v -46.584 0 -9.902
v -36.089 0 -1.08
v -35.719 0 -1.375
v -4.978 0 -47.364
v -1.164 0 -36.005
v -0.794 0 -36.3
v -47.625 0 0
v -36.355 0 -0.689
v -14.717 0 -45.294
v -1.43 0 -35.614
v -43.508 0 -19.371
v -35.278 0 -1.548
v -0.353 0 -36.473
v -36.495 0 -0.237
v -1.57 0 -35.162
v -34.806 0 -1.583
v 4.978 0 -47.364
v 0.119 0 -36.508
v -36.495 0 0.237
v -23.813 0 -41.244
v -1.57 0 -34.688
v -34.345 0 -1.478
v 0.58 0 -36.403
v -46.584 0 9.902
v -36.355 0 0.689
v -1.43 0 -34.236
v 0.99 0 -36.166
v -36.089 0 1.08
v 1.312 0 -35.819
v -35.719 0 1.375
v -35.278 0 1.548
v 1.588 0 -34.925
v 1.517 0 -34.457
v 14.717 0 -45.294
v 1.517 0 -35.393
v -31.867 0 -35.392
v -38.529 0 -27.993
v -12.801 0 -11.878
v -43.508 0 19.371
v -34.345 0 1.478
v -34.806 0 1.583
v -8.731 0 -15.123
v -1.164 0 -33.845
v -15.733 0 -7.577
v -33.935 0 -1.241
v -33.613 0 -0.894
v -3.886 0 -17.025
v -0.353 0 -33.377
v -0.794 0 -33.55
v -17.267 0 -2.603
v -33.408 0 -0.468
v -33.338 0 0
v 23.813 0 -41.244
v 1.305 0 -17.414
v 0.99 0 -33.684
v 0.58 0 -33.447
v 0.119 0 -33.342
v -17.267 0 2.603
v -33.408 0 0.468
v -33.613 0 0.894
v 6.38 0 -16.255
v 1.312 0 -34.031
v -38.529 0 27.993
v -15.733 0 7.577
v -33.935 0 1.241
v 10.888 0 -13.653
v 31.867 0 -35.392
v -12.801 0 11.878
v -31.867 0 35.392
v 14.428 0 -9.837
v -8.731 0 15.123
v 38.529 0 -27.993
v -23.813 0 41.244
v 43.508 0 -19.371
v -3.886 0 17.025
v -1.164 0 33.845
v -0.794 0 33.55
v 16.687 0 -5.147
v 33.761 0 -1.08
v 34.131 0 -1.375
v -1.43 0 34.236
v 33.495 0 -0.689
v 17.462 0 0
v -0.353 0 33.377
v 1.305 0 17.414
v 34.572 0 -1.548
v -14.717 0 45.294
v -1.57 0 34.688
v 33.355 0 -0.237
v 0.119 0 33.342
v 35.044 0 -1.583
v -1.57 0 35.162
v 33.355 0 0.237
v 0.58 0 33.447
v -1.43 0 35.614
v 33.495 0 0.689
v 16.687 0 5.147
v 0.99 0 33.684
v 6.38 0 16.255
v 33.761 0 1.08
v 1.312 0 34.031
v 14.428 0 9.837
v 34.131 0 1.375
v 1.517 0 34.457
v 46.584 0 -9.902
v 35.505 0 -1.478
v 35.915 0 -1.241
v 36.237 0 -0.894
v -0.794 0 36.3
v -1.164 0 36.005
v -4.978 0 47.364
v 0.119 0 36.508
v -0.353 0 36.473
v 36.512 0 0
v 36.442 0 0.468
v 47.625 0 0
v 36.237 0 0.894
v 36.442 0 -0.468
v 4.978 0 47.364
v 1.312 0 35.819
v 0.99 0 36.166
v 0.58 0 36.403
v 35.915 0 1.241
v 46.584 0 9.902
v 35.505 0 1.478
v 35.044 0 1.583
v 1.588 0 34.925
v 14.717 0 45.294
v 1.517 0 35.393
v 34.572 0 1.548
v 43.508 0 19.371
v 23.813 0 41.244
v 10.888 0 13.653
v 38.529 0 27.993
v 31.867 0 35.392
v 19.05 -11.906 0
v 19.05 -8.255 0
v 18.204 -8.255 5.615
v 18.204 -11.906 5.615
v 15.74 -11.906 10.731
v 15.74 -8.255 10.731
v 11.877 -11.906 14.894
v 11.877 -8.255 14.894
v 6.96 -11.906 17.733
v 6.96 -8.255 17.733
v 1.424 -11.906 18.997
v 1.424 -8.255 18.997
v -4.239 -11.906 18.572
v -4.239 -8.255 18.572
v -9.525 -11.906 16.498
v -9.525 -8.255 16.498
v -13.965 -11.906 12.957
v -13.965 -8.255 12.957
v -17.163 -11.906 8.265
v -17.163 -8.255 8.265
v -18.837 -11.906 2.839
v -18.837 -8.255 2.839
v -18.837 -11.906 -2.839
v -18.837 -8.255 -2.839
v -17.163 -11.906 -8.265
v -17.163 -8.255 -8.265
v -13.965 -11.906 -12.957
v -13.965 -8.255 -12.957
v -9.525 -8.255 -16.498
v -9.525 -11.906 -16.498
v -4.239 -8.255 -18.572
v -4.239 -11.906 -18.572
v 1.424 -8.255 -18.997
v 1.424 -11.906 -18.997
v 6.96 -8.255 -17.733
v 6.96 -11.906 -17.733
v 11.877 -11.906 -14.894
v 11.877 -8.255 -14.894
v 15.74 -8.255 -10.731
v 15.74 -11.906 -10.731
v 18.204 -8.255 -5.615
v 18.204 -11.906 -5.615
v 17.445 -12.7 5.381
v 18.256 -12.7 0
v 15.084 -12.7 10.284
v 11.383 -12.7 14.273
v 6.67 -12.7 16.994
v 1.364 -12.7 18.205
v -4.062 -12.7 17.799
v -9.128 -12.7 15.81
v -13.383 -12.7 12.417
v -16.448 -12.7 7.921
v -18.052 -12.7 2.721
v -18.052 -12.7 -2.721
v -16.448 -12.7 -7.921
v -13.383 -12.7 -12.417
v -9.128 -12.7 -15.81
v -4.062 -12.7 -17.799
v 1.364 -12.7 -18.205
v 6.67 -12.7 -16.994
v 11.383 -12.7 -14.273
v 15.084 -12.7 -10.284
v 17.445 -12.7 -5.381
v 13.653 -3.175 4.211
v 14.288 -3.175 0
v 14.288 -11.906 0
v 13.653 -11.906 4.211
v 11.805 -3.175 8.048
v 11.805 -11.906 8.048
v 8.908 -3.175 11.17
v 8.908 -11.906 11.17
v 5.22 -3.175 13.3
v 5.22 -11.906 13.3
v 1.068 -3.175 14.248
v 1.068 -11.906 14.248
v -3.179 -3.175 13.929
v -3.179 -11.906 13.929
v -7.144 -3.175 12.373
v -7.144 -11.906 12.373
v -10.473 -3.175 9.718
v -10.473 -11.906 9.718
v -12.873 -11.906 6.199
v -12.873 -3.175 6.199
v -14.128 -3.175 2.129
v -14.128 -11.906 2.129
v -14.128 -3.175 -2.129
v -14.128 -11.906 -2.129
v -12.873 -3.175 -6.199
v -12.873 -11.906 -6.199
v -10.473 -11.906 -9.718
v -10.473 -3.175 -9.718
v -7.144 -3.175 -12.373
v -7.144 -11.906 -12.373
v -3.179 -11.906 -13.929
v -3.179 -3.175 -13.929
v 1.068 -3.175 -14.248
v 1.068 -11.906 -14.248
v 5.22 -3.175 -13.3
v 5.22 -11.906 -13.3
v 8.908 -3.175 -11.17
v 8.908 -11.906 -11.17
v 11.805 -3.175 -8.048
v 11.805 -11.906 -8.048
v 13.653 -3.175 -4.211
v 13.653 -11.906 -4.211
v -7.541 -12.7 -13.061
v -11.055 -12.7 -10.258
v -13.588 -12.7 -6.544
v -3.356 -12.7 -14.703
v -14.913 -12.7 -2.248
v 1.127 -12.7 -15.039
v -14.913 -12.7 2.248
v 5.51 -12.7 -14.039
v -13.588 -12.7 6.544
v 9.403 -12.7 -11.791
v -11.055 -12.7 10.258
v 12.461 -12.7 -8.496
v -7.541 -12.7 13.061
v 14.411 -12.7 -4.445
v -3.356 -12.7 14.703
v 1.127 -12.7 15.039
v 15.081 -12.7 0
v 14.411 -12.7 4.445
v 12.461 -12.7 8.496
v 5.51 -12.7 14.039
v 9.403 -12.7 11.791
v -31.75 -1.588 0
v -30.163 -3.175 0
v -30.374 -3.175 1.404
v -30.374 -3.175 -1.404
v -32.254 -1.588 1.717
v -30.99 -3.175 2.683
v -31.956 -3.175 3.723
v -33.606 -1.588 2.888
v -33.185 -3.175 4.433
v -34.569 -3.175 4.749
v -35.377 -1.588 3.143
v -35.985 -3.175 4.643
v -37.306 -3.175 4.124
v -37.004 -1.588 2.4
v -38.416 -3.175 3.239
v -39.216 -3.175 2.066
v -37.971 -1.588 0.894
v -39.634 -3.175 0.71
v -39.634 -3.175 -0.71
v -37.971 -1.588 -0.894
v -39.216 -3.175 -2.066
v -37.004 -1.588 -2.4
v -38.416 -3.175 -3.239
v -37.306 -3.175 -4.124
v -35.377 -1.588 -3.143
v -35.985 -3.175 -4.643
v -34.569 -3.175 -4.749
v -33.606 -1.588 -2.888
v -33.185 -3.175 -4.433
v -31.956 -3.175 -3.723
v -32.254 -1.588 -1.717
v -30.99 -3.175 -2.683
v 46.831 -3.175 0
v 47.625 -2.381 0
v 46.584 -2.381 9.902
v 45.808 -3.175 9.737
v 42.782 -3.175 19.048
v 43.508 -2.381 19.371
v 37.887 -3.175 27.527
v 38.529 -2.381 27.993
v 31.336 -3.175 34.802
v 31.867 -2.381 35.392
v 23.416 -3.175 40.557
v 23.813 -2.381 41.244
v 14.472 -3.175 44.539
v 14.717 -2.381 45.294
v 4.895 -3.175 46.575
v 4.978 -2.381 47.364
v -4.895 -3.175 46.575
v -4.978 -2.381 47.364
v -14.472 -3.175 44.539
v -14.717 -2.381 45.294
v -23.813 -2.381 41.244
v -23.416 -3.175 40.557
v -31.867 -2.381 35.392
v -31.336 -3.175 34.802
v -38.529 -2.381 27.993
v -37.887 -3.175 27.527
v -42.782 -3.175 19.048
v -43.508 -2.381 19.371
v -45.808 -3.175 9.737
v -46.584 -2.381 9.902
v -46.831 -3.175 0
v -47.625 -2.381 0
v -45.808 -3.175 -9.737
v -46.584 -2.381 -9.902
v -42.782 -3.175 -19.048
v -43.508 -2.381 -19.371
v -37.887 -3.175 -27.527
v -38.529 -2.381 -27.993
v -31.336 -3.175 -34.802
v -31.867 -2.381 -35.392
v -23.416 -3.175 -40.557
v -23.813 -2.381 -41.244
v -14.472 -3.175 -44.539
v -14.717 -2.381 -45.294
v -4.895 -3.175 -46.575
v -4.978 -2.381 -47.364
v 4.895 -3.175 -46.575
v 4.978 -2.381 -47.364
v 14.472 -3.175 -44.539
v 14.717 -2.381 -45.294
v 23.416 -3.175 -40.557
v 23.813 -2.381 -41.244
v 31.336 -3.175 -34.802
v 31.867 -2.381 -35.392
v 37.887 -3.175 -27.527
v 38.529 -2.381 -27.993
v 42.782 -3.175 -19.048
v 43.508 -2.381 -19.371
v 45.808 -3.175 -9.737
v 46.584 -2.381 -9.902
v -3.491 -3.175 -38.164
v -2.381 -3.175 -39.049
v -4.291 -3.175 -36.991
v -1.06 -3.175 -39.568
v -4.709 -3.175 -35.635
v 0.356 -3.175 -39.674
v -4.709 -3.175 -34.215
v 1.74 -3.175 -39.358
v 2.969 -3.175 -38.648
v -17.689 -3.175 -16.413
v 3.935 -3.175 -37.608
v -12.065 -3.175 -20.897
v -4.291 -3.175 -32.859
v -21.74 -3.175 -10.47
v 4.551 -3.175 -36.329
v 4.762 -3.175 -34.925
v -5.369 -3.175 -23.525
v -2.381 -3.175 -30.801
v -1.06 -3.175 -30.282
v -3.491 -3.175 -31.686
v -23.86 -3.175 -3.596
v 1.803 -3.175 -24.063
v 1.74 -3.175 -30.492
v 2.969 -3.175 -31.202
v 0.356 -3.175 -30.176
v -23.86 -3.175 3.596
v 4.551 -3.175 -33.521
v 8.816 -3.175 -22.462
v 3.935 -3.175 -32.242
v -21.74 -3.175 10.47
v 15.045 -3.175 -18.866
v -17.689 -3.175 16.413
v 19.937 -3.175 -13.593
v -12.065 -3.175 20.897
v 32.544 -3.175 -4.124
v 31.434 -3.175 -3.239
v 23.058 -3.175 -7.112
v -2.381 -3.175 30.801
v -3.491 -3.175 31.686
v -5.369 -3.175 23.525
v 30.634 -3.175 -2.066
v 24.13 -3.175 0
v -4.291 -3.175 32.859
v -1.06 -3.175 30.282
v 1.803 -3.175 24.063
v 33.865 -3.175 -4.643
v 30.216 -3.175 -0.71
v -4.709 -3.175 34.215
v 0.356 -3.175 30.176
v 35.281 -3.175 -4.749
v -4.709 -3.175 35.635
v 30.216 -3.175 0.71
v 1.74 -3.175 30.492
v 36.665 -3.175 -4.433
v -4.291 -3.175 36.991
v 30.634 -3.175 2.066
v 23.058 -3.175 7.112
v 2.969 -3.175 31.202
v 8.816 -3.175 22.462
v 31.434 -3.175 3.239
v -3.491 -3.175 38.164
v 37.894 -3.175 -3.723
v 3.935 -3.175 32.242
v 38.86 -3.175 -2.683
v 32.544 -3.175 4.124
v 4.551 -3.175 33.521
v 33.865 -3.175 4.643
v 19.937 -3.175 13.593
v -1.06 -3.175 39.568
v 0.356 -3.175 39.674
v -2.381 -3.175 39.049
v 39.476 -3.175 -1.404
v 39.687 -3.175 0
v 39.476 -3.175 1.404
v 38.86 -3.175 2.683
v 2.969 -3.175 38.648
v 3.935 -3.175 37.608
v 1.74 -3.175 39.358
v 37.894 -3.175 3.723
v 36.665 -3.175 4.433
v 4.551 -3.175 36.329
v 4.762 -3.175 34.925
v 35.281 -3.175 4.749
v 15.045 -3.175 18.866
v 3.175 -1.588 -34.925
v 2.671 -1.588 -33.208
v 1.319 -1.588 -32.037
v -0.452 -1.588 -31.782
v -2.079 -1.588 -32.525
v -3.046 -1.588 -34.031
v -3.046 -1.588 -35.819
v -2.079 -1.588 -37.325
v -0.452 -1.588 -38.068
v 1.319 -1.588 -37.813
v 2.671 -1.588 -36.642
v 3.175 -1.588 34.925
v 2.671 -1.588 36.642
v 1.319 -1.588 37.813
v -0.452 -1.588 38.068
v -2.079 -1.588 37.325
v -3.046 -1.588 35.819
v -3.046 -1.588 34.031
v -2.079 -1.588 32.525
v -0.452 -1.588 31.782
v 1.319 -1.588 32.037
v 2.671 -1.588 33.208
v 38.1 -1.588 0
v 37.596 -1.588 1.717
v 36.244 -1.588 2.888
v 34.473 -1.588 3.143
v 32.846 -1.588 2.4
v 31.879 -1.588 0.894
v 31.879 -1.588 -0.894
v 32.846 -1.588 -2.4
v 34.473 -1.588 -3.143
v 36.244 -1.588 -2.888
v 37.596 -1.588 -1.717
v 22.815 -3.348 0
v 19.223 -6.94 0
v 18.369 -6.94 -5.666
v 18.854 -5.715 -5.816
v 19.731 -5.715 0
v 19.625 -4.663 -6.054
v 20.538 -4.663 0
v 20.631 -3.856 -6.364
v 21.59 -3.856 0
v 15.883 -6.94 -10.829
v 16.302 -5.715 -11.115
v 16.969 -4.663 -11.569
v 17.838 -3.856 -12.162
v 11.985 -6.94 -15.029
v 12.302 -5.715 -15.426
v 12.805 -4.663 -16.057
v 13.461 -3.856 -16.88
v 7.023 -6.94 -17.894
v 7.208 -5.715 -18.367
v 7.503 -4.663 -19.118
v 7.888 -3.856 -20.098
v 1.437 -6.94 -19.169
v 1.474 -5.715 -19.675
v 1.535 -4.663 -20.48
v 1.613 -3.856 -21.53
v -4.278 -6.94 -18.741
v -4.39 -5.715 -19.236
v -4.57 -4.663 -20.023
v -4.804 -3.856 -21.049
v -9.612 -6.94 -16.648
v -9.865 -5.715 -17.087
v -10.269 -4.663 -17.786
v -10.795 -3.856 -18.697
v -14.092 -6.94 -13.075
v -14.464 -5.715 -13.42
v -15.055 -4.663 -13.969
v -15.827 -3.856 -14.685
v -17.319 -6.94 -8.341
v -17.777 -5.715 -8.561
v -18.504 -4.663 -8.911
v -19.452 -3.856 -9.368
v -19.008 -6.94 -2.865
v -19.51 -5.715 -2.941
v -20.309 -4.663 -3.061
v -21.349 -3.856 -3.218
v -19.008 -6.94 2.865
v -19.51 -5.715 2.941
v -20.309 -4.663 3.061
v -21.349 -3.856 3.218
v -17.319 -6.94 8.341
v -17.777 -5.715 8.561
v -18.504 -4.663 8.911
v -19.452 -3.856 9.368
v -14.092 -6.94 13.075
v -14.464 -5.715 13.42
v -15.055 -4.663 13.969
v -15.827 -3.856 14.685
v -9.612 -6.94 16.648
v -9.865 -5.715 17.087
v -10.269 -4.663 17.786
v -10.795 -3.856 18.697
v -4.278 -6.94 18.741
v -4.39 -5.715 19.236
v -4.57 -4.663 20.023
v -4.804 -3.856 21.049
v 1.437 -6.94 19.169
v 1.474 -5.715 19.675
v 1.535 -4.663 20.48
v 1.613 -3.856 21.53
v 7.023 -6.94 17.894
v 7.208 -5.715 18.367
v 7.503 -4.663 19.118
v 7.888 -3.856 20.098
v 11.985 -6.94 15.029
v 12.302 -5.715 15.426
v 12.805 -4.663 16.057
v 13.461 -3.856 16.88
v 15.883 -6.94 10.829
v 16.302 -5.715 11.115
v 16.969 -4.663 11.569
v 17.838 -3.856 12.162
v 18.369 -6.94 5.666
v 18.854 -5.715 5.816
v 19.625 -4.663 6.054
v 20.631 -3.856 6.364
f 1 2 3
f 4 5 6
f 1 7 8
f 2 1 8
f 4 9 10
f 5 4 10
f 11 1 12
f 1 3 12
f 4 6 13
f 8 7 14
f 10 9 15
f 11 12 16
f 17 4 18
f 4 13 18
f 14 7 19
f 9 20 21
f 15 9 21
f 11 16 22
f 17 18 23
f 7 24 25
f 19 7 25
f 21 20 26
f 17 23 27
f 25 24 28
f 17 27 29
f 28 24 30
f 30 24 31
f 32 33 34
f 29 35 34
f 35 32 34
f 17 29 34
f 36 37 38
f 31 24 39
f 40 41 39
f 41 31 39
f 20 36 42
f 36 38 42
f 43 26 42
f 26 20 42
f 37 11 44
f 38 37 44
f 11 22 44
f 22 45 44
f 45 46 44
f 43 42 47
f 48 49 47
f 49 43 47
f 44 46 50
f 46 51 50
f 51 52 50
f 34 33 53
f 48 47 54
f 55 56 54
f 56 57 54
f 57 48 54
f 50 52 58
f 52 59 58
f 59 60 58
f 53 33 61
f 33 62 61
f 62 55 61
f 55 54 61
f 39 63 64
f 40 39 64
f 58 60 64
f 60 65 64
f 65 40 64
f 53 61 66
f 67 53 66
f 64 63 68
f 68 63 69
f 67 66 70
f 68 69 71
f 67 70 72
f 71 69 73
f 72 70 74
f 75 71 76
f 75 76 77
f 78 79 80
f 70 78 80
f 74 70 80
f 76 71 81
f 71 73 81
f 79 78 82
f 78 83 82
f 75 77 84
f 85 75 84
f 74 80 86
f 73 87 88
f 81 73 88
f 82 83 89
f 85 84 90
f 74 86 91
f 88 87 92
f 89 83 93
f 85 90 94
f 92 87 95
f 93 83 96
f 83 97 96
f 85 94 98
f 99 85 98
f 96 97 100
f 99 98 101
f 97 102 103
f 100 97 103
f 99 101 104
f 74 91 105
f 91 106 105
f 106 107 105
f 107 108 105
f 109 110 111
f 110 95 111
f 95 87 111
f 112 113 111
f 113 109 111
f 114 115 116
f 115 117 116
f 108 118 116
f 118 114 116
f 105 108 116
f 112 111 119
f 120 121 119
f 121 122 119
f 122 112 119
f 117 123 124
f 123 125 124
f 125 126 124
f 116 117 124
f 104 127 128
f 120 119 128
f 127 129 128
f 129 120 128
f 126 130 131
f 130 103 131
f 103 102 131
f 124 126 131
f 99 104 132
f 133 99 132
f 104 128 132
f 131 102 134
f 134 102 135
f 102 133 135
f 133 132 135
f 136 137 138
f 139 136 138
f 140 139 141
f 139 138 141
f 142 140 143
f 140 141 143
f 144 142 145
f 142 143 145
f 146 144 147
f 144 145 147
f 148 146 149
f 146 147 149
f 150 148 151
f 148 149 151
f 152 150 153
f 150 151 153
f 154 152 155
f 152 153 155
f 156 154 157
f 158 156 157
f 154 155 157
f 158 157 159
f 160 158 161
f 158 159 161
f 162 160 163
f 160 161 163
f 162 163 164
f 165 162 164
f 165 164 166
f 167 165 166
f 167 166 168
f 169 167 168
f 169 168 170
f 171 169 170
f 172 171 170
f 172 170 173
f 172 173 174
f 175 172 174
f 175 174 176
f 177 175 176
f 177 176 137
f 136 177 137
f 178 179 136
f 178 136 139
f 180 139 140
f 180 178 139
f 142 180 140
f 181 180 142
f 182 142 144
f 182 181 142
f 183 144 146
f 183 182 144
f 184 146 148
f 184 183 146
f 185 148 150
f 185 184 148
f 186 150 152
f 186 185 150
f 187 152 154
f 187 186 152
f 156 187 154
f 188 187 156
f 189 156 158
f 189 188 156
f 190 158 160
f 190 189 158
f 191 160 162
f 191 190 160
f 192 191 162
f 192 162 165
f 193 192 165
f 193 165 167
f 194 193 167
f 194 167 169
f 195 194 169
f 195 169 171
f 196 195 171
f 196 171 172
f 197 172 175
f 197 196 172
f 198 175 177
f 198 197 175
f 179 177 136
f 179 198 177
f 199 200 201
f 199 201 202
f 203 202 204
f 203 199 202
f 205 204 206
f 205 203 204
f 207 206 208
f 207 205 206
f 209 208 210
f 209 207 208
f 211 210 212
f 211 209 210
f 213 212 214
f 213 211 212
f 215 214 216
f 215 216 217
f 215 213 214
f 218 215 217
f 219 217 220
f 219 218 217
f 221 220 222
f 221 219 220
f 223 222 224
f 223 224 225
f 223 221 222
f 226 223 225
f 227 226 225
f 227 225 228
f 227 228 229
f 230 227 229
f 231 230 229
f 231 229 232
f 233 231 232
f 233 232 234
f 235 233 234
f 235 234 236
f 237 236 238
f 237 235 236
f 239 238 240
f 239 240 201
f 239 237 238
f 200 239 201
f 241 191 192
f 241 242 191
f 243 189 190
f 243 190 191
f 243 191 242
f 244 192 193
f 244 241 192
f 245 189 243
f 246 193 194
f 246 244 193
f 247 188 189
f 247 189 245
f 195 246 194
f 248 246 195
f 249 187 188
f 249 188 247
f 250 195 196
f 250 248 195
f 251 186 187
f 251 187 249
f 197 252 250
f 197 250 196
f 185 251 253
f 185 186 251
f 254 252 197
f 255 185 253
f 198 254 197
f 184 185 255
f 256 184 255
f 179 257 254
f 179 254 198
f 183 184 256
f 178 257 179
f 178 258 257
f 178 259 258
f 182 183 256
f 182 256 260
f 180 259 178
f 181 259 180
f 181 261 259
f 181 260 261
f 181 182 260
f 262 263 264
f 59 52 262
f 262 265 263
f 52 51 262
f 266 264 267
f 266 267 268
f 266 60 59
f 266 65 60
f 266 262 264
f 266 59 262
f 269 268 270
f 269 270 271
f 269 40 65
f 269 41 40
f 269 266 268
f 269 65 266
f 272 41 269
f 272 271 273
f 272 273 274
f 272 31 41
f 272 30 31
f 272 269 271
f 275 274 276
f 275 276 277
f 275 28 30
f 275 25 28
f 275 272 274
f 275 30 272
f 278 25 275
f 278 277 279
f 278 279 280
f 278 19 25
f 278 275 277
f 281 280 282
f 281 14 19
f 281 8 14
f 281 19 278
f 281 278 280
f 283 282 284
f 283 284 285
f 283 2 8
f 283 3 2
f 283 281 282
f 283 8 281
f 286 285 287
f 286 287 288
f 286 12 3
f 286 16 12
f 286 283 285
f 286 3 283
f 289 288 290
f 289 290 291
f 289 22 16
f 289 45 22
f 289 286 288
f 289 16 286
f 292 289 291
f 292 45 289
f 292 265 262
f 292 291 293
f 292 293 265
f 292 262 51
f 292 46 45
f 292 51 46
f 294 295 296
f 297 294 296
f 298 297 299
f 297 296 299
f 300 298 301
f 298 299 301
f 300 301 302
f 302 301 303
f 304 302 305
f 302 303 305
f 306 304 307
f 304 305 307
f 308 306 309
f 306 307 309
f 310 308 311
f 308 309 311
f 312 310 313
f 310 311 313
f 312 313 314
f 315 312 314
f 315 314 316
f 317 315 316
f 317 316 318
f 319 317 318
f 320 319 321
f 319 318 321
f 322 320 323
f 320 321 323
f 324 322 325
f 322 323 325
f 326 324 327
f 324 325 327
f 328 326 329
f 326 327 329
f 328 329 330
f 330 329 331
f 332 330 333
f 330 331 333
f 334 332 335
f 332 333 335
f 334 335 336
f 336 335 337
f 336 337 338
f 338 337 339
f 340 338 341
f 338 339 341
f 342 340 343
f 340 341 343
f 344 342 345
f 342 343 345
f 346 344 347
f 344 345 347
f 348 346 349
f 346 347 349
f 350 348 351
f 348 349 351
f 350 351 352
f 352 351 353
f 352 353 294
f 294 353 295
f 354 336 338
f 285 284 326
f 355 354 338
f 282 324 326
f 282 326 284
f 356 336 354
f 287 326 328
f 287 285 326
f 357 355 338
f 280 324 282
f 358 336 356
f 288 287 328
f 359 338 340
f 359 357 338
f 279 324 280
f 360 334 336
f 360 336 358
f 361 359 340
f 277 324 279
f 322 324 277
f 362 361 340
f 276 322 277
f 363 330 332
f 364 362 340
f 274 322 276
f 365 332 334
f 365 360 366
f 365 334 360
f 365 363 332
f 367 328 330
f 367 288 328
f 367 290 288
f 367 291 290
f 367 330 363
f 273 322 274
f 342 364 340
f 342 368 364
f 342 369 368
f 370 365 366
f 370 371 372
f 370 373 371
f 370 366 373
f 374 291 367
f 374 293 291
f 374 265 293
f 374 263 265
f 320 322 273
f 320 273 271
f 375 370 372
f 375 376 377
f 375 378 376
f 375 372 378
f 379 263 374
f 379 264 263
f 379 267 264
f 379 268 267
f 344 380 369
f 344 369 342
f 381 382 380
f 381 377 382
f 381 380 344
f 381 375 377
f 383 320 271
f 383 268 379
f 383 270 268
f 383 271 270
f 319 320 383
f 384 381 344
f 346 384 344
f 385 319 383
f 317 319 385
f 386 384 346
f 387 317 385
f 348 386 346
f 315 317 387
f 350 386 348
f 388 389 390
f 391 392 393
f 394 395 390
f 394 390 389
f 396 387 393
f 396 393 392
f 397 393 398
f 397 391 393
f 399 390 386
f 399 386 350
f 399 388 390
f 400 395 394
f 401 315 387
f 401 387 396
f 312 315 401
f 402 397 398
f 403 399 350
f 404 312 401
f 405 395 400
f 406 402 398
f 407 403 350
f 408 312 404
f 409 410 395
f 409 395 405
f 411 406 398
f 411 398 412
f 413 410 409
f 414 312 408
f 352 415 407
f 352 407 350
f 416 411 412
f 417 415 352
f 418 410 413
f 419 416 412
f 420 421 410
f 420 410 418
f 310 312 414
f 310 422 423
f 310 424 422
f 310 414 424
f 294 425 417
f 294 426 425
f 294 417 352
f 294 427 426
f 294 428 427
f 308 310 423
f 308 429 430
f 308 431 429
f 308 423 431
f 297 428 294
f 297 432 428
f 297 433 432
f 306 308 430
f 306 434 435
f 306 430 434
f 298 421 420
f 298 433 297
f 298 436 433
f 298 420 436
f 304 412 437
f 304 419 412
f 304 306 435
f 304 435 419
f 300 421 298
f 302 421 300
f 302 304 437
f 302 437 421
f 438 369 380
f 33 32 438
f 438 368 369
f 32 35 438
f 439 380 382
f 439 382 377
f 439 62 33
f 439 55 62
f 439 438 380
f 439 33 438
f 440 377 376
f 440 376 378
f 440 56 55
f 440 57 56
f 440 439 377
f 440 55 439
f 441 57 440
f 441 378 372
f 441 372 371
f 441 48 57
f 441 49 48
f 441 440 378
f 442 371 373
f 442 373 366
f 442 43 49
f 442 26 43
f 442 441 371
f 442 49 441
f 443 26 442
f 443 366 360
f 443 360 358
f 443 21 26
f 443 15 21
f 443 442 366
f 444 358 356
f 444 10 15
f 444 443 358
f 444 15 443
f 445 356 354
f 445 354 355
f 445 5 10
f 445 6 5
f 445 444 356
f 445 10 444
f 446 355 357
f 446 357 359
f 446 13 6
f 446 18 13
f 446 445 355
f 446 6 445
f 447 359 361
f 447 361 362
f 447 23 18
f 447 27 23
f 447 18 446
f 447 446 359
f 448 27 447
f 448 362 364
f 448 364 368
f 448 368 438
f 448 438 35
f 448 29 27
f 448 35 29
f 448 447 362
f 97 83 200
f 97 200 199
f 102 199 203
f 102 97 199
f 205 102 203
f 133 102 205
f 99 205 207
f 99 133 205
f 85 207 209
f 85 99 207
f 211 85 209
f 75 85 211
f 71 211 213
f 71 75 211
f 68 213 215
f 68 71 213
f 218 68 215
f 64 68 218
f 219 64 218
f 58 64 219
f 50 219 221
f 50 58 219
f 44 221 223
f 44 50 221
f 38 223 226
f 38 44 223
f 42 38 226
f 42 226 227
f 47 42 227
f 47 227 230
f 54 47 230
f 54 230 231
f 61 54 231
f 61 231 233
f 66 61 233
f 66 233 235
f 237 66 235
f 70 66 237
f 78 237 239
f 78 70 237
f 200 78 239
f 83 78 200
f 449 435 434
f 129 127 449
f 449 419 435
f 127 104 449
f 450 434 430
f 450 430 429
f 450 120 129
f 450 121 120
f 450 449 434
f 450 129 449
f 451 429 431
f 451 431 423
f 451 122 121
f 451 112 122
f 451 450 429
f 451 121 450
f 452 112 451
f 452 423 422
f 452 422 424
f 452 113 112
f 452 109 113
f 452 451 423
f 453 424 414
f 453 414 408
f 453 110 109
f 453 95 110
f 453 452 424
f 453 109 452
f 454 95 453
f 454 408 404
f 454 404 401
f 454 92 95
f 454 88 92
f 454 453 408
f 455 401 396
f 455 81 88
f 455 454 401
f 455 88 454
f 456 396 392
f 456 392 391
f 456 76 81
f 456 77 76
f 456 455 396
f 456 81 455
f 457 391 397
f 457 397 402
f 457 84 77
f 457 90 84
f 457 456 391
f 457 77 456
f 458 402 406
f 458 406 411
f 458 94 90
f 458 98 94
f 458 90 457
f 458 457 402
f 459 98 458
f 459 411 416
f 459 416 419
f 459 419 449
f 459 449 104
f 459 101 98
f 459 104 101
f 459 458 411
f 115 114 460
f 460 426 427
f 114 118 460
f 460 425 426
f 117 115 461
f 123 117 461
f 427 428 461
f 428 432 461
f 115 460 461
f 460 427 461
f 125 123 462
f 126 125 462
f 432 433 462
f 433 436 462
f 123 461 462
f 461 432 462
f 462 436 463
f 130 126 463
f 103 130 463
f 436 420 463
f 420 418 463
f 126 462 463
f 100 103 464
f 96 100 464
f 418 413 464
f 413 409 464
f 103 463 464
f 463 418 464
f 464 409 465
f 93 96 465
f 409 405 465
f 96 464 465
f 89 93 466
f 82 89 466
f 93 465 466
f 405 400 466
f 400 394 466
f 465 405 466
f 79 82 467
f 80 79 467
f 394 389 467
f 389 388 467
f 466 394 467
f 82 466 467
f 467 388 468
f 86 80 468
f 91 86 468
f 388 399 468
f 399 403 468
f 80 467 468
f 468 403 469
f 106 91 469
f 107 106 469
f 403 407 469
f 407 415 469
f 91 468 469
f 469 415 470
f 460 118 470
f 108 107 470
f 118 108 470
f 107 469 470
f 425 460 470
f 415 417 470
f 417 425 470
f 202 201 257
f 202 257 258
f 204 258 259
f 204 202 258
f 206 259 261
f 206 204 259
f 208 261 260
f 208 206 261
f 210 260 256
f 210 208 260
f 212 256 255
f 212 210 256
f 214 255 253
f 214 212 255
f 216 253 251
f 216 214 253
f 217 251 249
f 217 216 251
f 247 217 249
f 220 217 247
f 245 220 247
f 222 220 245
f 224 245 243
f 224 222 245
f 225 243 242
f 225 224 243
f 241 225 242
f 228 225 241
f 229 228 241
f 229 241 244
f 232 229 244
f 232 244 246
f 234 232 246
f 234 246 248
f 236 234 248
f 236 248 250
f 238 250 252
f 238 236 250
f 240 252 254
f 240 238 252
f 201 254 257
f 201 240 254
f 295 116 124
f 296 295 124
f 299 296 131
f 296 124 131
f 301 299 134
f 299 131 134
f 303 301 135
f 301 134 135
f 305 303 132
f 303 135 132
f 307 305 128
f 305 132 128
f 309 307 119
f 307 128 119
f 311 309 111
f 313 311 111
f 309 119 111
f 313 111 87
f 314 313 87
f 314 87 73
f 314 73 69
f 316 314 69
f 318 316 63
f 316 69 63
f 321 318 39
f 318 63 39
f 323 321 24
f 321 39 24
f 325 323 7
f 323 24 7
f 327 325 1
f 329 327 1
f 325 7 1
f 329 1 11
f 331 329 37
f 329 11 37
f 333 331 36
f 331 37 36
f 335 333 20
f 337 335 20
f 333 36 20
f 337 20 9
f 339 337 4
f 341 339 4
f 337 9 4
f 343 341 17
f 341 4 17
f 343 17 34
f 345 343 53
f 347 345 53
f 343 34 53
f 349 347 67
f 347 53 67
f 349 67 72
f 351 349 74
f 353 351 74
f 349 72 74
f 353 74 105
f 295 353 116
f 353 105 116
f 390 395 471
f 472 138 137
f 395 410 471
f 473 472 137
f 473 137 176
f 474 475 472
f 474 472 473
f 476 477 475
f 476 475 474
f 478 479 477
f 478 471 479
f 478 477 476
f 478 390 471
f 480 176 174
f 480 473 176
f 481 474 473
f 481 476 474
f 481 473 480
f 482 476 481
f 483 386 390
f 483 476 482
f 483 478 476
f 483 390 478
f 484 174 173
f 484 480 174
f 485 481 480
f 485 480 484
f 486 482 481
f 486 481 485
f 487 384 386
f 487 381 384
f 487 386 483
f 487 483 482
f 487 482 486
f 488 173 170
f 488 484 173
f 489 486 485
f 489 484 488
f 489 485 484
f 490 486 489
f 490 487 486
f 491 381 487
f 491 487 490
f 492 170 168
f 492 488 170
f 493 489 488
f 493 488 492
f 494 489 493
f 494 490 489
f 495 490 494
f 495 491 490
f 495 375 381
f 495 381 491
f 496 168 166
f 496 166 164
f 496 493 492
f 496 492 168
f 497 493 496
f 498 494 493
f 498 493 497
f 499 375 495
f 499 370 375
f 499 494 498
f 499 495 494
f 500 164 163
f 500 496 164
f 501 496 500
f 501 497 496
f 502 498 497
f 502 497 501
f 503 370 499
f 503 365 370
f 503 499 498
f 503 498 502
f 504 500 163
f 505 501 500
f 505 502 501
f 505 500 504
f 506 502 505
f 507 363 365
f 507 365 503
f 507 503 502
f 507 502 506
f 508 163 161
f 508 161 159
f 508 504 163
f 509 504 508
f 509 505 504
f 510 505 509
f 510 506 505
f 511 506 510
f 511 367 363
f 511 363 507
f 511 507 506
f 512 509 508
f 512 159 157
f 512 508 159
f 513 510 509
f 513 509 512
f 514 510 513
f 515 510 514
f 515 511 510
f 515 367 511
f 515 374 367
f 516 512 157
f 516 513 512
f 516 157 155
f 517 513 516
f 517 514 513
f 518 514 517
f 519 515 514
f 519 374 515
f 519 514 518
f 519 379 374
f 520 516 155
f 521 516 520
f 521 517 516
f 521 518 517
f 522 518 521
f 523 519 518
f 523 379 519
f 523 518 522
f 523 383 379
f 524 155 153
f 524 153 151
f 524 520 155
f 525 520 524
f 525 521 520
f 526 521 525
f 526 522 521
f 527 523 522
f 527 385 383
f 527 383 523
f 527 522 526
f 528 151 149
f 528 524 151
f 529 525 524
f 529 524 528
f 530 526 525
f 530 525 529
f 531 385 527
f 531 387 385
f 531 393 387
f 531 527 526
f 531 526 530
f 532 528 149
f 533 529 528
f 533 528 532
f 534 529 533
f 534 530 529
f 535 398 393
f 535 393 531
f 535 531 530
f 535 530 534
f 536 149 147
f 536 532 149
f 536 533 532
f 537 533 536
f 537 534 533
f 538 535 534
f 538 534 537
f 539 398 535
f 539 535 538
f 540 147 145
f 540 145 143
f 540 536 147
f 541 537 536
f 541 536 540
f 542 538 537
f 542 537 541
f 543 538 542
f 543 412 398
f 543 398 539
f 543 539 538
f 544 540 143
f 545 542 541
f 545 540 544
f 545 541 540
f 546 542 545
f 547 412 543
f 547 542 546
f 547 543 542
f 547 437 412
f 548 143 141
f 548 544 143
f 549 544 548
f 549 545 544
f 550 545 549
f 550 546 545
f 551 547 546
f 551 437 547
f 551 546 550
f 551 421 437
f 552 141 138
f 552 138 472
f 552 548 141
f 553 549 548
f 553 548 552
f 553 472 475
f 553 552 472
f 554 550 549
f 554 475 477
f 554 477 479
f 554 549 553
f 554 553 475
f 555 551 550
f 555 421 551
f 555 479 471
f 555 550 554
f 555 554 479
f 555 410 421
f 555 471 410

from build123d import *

# Parameters (mm, degrees)
F0_R     = 47.625
F0_R_2   = 1.5875
F0_R_3   = 19.05
F0_R_4   = 14.2875
F1_DEPTH = 3.175
F2_DEPTH = 12.7
F3_SIZE  = 3.17499
F4_SIZE  = 0.79375
F5_SIZE  = 0.79375
F6_R     = 5.08
F7_SIZE  = 3.175


# Not quite as in the source:
# - a fillet or chamfer is up to 0.001 mm smaller than in the source, because OpenCascade refuses the exact size


with BuildPart() as f1:
    # F0 (on Front) → F1 (new body)
    with BuildSketch(Plane.XZ):
        Circle(F0_R)
        with Locations((0, -34.925)):
            Circle(F0_R_2, mode=Mode.SUBTRACT)
        with Locations((-34.925, 0)):
            Circle(F0_R_2, mode=Mode.SUBTRACT)
        Circle(F0_R_3, mode=Mode.SUBTRACT)
        with Locations((34.925, 0)):
            Circle(F0_R_2, mode=Mode.SUBTRACT)
        with Locations((0, 34.925)):
            Circle(F0_R_2, mode=Mode.SUBTRACT)
        Circle(F0_R_3)
        Circle(F0_R_4, mode=Mode.SUBTRACT)
    extrude(amount=F1_DEPTH)

    # F0 (on Front) → F2 (join)
    with BuildSketch(Plane.XZ):
        Circle(F0_R_3)
        Circle(F0_R_4, mode=Mode.SUBTRACT)
    extrude(amount=F2_DEPTH)

    # F3 (size 3.175 in the source; OpenCascade refuses exactly that, so slightly less here)
    f3_edges = [f1.edges().sort_by_distance(p)[0] for p in [
        (-1.5875, -3.175, 34.925),
        (-36.5125, -3.175, 0),
        (33.3375, -3.175, 0),
        (-1.5875, -3.175, -34.925),
    ]]
    chamfer(f3_edges, length=F3_SIZE)

    # F4
    f4_edges = [f1.edges().sort_by_distance(p)[0] for p in [
        (-47.625, -3.175, 0),
    ]]
    chamfer(f4_edges, length=F4_SIZE)

    # F5
    f5_edges = [f1.edges().sort_by_distance(p)[0] for p in [
        (-19.05, -12.7, 0),
        (-14.2875, -12.7, 0),
    ]]
    chamfer(f5_edges, length=F5_SIZE)

    # F6
    f6_edges = [f1.edges().sort_by_distance(p)[0] for p in [
        (-19.05, -3.175, 0),
    ]]
    fillet(f6_edges, radius=F6_R)

    # F7
    f7_edges = [f1.edges().sort_by_distance(p)[0] for p in [
        (-14.2875, 0, 0),
    ]]
    chamfer(f7_edges, length=F7_SIZE)


solid = f1.part
